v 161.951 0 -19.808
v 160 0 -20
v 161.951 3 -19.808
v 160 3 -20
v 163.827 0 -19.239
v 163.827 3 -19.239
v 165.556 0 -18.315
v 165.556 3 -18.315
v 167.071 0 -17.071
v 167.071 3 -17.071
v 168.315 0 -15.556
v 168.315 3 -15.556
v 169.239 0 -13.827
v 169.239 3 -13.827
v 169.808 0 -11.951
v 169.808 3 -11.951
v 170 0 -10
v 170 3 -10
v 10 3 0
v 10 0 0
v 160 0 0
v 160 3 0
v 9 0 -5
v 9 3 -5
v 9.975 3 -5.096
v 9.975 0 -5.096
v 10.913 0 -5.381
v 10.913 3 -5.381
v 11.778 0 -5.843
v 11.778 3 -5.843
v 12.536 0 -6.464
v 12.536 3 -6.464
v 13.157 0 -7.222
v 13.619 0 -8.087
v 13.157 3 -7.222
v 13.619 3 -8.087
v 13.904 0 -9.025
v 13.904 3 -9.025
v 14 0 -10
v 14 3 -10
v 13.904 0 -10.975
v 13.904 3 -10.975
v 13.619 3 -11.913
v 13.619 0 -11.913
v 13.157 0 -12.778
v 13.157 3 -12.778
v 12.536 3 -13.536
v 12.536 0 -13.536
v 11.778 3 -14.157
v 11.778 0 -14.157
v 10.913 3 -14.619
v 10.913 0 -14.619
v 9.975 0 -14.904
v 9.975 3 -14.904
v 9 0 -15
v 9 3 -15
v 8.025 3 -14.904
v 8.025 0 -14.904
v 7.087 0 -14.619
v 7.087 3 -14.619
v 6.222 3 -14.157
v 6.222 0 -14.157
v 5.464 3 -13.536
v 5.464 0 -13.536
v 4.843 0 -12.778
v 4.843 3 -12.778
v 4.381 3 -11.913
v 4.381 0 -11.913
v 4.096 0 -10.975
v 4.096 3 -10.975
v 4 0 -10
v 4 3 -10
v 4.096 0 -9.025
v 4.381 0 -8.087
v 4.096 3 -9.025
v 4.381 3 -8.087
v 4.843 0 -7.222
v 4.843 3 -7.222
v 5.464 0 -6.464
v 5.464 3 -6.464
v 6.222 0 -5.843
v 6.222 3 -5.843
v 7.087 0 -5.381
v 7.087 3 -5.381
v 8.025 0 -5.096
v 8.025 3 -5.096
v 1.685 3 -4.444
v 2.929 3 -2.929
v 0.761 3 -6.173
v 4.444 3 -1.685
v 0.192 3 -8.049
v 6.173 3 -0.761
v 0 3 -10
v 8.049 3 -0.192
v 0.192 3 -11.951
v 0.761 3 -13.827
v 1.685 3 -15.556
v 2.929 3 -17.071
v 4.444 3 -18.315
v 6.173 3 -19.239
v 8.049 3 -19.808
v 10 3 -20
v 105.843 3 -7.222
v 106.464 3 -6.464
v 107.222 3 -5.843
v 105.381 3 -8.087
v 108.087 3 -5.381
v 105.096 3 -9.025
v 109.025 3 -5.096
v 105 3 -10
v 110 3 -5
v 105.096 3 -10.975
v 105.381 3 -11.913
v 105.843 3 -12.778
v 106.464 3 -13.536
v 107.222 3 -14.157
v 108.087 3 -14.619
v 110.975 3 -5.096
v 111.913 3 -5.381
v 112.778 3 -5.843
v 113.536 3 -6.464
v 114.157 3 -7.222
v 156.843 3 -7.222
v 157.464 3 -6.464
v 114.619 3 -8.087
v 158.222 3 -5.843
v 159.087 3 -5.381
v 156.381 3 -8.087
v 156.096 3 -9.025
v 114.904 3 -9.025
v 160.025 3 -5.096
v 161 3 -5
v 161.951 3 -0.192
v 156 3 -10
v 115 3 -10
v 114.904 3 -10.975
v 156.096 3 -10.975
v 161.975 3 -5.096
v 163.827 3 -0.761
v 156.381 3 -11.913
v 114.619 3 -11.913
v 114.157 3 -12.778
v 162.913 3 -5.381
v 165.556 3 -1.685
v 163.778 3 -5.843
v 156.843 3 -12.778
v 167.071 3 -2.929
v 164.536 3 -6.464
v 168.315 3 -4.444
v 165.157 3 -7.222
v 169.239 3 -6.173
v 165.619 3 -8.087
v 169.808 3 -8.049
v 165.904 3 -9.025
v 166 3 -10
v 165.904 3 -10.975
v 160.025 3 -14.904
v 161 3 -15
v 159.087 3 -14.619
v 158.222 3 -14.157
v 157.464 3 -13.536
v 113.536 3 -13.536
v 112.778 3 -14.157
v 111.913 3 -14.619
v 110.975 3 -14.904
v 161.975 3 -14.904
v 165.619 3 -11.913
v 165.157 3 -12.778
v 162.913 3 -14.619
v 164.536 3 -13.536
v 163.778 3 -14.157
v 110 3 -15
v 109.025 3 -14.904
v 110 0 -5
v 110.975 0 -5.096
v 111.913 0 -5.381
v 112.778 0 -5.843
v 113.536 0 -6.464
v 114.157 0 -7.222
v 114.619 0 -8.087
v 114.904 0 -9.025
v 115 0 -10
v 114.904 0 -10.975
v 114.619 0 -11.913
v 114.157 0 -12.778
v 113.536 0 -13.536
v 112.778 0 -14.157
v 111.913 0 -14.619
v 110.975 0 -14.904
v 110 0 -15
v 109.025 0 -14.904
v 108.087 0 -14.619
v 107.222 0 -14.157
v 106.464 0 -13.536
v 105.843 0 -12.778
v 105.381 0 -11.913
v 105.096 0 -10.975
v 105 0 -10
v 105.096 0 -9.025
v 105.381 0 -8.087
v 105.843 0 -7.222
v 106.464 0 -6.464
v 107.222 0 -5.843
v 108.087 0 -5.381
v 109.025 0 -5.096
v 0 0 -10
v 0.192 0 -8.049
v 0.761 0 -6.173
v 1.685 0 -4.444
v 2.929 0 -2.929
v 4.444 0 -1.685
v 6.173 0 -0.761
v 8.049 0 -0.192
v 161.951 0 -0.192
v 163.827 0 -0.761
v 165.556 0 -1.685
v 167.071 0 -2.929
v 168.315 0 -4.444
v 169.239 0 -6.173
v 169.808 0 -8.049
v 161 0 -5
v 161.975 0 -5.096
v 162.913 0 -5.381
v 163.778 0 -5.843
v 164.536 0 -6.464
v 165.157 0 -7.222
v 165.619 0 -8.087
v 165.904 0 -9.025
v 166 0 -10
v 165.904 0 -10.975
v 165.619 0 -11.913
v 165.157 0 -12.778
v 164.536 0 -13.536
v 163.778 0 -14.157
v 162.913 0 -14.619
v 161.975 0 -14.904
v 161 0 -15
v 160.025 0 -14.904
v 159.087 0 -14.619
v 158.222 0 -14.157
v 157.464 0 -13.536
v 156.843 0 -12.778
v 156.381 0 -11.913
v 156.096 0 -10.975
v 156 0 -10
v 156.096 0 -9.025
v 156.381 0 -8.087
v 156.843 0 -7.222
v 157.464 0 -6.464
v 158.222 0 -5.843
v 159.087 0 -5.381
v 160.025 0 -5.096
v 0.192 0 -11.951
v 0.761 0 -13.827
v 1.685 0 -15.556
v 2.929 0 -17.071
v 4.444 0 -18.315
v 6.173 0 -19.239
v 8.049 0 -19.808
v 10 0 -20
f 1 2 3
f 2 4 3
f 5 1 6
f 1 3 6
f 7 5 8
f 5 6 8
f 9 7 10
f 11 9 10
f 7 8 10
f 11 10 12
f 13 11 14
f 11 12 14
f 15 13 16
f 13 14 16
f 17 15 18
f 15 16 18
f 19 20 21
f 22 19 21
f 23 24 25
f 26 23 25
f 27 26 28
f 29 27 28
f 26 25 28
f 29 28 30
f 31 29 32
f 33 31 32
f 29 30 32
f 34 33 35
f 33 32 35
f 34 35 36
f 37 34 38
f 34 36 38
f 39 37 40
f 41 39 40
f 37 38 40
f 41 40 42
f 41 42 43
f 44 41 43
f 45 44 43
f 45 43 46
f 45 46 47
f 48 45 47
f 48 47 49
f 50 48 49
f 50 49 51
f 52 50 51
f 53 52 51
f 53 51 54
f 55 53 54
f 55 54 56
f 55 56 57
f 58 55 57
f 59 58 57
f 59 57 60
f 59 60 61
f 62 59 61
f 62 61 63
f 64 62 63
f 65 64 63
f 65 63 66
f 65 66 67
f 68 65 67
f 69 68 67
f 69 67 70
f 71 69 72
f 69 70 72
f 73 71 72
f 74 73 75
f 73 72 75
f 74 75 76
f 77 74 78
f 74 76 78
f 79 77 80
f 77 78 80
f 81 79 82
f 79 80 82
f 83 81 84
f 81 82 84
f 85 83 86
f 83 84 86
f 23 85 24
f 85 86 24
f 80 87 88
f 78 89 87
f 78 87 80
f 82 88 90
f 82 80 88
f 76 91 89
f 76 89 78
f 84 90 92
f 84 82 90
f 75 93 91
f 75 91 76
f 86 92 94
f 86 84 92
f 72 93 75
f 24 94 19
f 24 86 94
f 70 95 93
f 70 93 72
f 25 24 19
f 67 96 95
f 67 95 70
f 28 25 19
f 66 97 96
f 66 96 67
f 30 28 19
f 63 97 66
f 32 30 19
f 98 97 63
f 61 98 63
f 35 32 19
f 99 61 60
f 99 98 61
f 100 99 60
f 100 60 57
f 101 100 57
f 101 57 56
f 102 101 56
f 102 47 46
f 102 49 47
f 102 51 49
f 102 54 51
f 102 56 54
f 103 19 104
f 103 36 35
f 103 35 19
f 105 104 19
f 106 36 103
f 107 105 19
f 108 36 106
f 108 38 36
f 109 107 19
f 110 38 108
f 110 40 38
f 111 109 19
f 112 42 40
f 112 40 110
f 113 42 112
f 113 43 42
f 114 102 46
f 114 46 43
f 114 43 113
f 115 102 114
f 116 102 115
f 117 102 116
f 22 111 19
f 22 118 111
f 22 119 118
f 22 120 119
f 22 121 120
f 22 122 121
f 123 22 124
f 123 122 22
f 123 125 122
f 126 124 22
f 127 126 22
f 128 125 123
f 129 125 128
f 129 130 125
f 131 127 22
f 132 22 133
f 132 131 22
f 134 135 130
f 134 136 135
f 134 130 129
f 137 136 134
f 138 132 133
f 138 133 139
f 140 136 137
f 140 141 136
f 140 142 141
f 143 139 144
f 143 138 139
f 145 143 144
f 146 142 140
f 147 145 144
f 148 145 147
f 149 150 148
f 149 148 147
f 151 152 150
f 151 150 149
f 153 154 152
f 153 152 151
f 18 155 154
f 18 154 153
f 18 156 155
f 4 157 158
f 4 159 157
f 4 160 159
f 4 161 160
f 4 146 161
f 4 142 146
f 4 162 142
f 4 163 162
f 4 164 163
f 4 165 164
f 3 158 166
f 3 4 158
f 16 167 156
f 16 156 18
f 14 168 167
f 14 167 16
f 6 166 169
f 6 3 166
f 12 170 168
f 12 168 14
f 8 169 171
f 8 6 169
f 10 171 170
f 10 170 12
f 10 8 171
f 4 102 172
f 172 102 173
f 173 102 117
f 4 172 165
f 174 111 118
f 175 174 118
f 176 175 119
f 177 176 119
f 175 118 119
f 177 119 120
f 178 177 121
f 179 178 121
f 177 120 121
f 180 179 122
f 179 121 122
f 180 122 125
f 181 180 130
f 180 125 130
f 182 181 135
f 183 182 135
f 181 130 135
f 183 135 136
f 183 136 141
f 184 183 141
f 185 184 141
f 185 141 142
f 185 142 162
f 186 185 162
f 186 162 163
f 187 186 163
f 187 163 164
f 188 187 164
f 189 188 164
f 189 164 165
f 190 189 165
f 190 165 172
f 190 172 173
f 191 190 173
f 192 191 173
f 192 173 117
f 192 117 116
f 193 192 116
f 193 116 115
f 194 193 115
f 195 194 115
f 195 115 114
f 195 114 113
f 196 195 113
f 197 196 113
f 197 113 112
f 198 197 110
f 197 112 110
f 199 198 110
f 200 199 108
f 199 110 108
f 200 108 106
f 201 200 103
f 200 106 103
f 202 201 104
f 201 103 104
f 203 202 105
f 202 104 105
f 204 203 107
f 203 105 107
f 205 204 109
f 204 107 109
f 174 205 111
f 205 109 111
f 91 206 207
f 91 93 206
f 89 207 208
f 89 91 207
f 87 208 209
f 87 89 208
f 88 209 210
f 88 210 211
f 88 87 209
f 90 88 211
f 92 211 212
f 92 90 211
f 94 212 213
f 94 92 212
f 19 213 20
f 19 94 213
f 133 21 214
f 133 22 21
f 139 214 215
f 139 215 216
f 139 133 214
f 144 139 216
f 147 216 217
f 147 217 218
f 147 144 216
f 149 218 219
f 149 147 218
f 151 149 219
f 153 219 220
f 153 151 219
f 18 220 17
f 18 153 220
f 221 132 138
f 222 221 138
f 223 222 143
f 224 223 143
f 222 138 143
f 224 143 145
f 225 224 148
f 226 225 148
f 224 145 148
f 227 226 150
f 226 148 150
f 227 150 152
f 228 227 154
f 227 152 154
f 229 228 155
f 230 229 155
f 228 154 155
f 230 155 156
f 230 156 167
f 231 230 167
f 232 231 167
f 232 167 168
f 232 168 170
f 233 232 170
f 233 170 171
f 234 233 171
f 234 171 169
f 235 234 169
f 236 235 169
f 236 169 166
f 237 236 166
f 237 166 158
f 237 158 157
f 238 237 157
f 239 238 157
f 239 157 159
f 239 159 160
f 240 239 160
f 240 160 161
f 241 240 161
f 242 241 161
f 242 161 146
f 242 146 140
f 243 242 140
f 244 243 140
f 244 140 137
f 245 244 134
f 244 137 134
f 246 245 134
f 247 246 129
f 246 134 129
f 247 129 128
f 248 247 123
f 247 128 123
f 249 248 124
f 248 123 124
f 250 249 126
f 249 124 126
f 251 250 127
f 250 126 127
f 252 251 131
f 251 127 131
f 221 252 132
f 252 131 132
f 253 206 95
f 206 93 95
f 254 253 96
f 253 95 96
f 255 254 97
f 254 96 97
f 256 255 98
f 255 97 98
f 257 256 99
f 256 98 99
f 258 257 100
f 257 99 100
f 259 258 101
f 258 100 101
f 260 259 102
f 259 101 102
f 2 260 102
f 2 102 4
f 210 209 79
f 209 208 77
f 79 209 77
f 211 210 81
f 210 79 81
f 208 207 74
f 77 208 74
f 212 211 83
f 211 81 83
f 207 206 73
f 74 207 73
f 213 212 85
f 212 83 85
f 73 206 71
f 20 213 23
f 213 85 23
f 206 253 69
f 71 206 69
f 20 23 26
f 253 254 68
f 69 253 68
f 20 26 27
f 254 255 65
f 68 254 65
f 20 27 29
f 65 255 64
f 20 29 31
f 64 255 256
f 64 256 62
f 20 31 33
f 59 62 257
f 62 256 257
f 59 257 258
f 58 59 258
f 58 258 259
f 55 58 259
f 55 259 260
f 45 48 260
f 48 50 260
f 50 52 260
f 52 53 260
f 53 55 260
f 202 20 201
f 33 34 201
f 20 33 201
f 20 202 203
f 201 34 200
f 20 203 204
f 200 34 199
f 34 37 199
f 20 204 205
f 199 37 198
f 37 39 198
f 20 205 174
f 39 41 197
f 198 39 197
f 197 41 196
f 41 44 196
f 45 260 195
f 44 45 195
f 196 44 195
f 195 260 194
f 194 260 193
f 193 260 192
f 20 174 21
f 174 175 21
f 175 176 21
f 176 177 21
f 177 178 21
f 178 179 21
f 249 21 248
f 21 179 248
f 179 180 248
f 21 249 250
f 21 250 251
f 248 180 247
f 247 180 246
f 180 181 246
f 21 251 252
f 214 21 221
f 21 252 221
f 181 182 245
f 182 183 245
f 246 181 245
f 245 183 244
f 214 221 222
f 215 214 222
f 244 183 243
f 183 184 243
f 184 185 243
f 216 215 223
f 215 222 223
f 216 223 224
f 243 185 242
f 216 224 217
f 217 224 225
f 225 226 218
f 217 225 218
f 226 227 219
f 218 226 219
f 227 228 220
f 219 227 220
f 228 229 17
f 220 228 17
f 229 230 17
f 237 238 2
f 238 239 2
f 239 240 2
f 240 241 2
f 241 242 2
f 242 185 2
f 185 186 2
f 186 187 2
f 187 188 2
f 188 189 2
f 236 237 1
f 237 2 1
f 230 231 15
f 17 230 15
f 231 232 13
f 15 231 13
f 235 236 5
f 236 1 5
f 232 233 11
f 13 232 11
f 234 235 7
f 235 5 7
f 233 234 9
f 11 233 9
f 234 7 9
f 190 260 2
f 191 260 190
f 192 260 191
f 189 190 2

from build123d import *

# Parameters (mm, degrees)
SKETCH2_W           = 170
SKETCH2_H           = 20
BOSS_EXTRUDE1_DEPTH = 3
SKETCH3_R           = 5
CUT_EXTRUDE1_DEPTH  = 172.198714948
SKETCH4_R           = 5
CUT_EXTRUDE2_DEPTH  = 172.198714948
FILLET1_R           = 10
FILLET2_R           = 10
SKETCH5_R           = 5
CUT_EXTRUDE3_DEPTH  = 172.198714948


with BuildPart() as part:
    # Sketch2 → Boss-Extrude1 (new body)
    with BuildSketch(Plane(origin=(0, 0, 0), x_dir=(1, 0, 0), z_dir=(0, 1, 0))):
        with Locations((85, 10)):
            Rectangle(SKETCH2_W, SKETCH2_H)
    extrude(amount=BOSS_EXTRUDE1_DEPTH)

    # Sketch3 → Cut-Extrude1 (cut, through all)
    with BuildSketch(Plane(origin=(0, 3, 0), x_dir=(1, 0, 0), z_dir=(0, 1, 0))):
        with Locations(Location((9, 10, 0), (0, 0, 270))):
            Circle(SKETCH3_R)
    extrude(amount=-CUT_EXTRUDE1_DEPTH, mode=Mode.SUBTRACT)

    # Sketch4 → Cut-Extrude2 (cut, through all)
    with BuildSketch(Plane(origin=(0, 3, 0), x_dir=(1, 0, 0), z_dir=(0, 1, 0))):
        with Locations(Location((161, 10, 0), (0, 0, 270))):
            Circle(SKETCH4_R)
    extrude(amount=-CUT_EXTRUDE2_DEPTH, mode=Mode.SUBTRACT)

    # Fillet1
    fillet1_edges = [part.edges().sort_by_distance(p)[0] for p in [
        (0, 1.5, -20),
        (0, 1.5, 0),
    ]]
    fillet(fillet1_edges, radius=FILLET1_R - 0.0001)  # a hair under: the kernel refuses the full size

    # Fillet2
    fillet2_edges = [part.edges().sort_by_distance(p)[0] for p in [
        (170, 1.5, -20),
        (170, 1.5, 0),
    ]]
    fillet(fillet2_edges, radius=FILLET2_R - 0.0001)  # a hair under: the kernel refuses the full size

    # Sketch5 → Cut-Extrude3 (cut, through all)
    with BuildSketch(Plane(origin=(0, 3, 0), x_dir=(1, 0, 0), z_dir=(0, 1, 0))):
        with Locations(Location((110, 10, 0), (0, 0, 270))):
            Circle(SKETCH5_R)
    extrude(amount=-CUT_EXTRUDE3_DEPTH, mode=Mode.SUBTRACT)


solid = part.part
